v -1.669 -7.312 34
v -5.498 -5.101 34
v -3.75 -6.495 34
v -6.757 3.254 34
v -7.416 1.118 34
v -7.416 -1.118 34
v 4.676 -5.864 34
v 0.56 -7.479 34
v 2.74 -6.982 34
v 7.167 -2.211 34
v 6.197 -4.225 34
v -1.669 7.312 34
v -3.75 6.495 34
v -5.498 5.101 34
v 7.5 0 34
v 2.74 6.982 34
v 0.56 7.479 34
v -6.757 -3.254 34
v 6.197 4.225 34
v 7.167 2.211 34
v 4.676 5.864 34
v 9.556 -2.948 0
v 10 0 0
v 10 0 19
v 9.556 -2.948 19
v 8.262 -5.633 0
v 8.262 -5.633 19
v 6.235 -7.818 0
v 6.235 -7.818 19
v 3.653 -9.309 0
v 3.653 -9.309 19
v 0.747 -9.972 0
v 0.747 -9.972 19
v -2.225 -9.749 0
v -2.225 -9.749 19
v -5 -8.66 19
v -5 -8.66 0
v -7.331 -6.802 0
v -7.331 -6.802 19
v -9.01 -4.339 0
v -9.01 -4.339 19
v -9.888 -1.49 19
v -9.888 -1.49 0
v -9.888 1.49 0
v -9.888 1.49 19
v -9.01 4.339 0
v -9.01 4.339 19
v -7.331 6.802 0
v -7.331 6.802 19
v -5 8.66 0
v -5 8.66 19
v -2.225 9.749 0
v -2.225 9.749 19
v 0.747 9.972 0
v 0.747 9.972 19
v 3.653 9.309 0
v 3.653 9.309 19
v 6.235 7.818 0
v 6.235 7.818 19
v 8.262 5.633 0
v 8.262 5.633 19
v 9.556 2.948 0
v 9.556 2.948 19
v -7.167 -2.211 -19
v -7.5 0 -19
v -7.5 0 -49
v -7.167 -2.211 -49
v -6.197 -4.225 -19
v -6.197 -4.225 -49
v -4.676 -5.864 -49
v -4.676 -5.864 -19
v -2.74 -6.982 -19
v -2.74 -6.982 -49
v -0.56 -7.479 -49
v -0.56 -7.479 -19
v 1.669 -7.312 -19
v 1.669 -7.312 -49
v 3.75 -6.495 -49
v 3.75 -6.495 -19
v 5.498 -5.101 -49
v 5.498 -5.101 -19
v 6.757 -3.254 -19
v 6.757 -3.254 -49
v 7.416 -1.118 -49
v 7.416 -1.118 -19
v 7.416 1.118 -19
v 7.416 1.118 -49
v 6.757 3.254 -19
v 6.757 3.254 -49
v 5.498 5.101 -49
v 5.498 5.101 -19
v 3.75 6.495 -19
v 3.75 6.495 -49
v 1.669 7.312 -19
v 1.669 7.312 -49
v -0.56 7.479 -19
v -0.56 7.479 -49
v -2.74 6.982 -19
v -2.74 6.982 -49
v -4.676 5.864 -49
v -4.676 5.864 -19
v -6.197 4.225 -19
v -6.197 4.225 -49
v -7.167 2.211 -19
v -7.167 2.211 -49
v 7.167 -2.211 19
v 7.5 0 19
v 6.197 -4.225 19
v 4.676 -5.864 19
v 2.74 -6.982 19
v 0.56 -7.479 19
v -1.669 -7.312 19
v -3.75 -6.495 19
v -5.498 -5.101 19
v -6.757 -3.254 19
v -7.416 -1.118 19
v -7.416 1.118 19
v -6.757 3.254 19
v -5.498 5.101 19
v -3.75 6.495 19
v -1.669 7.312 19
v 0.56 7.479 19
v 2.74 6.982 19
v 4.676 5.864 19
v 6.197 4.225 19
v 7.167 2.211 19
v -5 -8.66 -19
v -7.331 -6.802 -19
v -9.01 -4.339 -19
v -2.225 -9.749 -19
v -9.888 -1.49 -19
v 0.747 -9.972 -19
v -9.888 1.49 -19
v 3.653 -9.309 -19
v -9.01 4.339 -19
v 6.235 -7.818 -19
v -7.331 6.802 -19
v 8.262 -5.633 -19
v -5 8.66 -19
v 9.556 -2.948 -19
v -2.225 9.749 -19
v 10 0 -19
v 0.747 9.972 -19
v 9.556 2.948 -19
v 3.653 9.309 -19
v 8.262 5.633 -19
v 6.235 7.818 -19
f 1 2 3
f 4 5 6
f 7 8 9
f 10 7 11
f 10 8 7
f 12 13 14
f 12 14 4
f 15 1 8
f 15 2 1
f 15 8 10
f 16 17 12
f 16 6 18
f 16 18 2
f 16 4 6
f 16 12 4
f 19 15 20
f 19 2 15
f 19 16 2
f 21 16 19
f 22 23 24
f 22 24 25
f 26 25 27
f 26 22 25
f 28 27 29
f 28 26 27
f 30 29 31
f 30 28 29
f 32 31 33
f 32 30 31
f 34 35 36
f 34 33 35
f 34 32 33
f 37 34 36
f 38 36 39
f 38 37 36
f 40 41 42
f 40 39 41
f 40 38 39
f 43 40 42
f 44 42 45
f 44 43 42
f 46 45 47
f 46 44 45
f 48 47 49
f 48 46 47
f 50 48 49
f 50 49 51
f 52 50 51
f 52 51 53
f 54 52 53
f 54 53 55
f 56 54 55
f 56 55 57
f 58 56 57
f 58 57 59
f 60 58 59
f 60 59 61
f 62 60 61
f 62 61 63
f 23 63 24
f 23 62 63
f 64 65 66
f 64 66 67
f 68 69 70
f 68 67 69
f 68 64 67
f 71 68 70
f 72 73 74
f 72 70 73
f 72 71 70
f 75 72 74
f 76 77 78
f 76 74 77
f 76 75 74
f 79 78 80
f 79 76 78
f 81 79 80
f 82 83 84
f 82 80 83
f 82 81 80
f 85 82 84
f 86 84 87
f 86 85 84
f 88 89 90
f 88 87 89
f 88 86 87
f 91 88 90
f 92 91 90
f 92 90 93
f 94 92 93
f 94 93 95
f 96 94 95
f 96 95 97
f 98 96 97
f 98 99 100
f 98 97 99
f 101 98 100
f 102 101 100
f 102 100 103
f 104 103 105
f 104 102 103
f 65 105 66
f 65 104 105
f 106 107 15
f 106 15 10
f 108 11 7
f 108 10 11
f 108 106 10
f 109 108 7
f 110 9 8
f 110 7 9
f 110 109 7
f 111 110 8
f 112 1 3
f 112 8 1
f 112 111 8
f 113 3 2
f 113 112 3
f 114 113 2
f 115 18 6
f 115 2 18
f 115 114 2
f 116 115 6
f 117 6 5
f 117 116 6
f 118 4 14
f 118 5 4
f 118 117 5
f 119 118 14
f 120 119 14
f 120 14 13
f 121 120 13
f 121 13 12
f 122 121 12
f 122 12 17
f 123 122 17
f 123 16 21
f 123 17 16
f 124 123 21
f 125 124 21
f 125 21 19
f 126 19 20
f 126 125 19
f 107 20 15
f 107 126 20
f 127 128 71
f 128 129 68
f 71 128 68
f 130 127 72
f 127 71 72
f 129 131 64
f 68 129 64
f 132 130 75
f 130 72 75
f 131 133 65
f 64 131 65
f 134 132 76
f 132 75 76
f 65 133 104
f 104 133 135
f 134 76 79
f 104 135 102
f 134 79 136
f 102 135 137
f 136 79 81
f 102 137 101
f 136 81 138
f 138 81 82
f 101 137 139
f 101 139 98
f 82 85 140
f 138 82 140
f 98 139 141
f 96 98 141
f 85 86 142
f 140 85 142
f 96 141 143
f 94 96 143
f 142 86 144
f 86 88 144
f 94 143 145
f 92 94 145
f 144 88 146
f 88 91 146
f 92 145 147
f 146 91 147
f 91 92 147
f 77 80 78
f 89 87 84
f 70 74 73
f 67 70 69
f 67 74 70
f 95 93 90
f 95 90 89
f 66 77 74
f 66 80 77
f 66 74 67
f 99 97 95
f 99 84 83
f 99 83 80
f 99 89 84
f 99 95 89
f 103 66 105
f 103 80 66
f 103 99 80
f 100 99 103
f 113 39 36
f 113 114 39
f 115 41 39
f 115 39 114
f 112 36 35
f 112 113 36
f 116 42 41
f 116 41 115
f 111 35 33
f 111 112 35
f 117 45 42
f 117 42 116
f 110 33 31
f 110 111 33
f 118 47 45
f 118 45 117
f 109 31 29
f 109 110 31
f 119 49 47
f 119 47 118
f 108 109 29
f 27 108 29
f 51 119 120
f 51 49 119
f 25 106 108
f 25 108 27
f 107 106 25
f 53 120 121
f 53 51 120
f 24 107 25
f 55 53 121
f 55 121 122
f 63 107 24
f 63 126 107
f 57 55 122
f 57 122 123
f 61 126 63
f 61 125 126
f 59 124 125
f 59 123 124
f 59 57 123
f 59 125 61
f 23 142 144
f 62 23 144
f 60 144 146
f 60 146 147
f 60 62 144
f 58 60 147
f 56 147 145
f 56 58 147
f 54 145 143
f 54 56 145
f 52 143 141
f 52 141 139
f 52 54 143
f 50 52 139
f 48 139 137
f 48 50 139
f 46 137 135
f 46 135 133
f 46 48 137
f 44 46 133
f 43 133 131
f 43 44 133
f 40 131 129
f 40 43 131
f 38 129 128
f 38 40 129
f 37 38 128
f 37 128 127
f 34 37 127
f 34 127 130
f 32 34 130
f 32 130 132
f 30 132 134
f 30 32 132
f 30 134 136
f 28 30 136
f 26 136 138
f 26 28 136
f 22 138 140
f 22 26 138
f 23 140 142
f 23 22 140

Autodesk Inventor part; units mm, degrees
ref_plane "YZ Plane" through (0, 0, 0) normal (1, 0, 0) x (0, 1, 0)
ref_plane "XZ Plane" through (0, 0, 0) normal (0, 1, 0) x (-1, 0, 0)
ref_plane "XY Plane" through (0, 0, 0) normal (0, 0, 1) x (1, 0, 0)
sketch "Sketch1" plane through (0, 0, 0) normal (0, 0, 1) x (1, 0, 0)
  circle A0 centre (0, 0) radius 10
  dimension "d0" = 20
extrude "Extrusion1" add sketch "Sketch1" along normal mid plane 38
sketch "Sketch2" plane through (0, 0, 19) normal (0, 0, 1) x (1, 0, 0)
  circle A0 centre (0, 0) radius 7.5
  dimension "d3" = 15
extrude "Extrusion2" add sketch "Sketch2" along normal blind 15
sketch "Sketch3" plane through (0, 0, -19) normal (0, 0, -1) x (-1, 0, 0)
  circle A0 centre (0, 0) radius 7.5
  dimension "d7" = 15
extrude "Extrusion3" add sketch "Sketch3" along normal blind 30
equation "\"d7\" = d3"
properties part number "Foreas_1"
